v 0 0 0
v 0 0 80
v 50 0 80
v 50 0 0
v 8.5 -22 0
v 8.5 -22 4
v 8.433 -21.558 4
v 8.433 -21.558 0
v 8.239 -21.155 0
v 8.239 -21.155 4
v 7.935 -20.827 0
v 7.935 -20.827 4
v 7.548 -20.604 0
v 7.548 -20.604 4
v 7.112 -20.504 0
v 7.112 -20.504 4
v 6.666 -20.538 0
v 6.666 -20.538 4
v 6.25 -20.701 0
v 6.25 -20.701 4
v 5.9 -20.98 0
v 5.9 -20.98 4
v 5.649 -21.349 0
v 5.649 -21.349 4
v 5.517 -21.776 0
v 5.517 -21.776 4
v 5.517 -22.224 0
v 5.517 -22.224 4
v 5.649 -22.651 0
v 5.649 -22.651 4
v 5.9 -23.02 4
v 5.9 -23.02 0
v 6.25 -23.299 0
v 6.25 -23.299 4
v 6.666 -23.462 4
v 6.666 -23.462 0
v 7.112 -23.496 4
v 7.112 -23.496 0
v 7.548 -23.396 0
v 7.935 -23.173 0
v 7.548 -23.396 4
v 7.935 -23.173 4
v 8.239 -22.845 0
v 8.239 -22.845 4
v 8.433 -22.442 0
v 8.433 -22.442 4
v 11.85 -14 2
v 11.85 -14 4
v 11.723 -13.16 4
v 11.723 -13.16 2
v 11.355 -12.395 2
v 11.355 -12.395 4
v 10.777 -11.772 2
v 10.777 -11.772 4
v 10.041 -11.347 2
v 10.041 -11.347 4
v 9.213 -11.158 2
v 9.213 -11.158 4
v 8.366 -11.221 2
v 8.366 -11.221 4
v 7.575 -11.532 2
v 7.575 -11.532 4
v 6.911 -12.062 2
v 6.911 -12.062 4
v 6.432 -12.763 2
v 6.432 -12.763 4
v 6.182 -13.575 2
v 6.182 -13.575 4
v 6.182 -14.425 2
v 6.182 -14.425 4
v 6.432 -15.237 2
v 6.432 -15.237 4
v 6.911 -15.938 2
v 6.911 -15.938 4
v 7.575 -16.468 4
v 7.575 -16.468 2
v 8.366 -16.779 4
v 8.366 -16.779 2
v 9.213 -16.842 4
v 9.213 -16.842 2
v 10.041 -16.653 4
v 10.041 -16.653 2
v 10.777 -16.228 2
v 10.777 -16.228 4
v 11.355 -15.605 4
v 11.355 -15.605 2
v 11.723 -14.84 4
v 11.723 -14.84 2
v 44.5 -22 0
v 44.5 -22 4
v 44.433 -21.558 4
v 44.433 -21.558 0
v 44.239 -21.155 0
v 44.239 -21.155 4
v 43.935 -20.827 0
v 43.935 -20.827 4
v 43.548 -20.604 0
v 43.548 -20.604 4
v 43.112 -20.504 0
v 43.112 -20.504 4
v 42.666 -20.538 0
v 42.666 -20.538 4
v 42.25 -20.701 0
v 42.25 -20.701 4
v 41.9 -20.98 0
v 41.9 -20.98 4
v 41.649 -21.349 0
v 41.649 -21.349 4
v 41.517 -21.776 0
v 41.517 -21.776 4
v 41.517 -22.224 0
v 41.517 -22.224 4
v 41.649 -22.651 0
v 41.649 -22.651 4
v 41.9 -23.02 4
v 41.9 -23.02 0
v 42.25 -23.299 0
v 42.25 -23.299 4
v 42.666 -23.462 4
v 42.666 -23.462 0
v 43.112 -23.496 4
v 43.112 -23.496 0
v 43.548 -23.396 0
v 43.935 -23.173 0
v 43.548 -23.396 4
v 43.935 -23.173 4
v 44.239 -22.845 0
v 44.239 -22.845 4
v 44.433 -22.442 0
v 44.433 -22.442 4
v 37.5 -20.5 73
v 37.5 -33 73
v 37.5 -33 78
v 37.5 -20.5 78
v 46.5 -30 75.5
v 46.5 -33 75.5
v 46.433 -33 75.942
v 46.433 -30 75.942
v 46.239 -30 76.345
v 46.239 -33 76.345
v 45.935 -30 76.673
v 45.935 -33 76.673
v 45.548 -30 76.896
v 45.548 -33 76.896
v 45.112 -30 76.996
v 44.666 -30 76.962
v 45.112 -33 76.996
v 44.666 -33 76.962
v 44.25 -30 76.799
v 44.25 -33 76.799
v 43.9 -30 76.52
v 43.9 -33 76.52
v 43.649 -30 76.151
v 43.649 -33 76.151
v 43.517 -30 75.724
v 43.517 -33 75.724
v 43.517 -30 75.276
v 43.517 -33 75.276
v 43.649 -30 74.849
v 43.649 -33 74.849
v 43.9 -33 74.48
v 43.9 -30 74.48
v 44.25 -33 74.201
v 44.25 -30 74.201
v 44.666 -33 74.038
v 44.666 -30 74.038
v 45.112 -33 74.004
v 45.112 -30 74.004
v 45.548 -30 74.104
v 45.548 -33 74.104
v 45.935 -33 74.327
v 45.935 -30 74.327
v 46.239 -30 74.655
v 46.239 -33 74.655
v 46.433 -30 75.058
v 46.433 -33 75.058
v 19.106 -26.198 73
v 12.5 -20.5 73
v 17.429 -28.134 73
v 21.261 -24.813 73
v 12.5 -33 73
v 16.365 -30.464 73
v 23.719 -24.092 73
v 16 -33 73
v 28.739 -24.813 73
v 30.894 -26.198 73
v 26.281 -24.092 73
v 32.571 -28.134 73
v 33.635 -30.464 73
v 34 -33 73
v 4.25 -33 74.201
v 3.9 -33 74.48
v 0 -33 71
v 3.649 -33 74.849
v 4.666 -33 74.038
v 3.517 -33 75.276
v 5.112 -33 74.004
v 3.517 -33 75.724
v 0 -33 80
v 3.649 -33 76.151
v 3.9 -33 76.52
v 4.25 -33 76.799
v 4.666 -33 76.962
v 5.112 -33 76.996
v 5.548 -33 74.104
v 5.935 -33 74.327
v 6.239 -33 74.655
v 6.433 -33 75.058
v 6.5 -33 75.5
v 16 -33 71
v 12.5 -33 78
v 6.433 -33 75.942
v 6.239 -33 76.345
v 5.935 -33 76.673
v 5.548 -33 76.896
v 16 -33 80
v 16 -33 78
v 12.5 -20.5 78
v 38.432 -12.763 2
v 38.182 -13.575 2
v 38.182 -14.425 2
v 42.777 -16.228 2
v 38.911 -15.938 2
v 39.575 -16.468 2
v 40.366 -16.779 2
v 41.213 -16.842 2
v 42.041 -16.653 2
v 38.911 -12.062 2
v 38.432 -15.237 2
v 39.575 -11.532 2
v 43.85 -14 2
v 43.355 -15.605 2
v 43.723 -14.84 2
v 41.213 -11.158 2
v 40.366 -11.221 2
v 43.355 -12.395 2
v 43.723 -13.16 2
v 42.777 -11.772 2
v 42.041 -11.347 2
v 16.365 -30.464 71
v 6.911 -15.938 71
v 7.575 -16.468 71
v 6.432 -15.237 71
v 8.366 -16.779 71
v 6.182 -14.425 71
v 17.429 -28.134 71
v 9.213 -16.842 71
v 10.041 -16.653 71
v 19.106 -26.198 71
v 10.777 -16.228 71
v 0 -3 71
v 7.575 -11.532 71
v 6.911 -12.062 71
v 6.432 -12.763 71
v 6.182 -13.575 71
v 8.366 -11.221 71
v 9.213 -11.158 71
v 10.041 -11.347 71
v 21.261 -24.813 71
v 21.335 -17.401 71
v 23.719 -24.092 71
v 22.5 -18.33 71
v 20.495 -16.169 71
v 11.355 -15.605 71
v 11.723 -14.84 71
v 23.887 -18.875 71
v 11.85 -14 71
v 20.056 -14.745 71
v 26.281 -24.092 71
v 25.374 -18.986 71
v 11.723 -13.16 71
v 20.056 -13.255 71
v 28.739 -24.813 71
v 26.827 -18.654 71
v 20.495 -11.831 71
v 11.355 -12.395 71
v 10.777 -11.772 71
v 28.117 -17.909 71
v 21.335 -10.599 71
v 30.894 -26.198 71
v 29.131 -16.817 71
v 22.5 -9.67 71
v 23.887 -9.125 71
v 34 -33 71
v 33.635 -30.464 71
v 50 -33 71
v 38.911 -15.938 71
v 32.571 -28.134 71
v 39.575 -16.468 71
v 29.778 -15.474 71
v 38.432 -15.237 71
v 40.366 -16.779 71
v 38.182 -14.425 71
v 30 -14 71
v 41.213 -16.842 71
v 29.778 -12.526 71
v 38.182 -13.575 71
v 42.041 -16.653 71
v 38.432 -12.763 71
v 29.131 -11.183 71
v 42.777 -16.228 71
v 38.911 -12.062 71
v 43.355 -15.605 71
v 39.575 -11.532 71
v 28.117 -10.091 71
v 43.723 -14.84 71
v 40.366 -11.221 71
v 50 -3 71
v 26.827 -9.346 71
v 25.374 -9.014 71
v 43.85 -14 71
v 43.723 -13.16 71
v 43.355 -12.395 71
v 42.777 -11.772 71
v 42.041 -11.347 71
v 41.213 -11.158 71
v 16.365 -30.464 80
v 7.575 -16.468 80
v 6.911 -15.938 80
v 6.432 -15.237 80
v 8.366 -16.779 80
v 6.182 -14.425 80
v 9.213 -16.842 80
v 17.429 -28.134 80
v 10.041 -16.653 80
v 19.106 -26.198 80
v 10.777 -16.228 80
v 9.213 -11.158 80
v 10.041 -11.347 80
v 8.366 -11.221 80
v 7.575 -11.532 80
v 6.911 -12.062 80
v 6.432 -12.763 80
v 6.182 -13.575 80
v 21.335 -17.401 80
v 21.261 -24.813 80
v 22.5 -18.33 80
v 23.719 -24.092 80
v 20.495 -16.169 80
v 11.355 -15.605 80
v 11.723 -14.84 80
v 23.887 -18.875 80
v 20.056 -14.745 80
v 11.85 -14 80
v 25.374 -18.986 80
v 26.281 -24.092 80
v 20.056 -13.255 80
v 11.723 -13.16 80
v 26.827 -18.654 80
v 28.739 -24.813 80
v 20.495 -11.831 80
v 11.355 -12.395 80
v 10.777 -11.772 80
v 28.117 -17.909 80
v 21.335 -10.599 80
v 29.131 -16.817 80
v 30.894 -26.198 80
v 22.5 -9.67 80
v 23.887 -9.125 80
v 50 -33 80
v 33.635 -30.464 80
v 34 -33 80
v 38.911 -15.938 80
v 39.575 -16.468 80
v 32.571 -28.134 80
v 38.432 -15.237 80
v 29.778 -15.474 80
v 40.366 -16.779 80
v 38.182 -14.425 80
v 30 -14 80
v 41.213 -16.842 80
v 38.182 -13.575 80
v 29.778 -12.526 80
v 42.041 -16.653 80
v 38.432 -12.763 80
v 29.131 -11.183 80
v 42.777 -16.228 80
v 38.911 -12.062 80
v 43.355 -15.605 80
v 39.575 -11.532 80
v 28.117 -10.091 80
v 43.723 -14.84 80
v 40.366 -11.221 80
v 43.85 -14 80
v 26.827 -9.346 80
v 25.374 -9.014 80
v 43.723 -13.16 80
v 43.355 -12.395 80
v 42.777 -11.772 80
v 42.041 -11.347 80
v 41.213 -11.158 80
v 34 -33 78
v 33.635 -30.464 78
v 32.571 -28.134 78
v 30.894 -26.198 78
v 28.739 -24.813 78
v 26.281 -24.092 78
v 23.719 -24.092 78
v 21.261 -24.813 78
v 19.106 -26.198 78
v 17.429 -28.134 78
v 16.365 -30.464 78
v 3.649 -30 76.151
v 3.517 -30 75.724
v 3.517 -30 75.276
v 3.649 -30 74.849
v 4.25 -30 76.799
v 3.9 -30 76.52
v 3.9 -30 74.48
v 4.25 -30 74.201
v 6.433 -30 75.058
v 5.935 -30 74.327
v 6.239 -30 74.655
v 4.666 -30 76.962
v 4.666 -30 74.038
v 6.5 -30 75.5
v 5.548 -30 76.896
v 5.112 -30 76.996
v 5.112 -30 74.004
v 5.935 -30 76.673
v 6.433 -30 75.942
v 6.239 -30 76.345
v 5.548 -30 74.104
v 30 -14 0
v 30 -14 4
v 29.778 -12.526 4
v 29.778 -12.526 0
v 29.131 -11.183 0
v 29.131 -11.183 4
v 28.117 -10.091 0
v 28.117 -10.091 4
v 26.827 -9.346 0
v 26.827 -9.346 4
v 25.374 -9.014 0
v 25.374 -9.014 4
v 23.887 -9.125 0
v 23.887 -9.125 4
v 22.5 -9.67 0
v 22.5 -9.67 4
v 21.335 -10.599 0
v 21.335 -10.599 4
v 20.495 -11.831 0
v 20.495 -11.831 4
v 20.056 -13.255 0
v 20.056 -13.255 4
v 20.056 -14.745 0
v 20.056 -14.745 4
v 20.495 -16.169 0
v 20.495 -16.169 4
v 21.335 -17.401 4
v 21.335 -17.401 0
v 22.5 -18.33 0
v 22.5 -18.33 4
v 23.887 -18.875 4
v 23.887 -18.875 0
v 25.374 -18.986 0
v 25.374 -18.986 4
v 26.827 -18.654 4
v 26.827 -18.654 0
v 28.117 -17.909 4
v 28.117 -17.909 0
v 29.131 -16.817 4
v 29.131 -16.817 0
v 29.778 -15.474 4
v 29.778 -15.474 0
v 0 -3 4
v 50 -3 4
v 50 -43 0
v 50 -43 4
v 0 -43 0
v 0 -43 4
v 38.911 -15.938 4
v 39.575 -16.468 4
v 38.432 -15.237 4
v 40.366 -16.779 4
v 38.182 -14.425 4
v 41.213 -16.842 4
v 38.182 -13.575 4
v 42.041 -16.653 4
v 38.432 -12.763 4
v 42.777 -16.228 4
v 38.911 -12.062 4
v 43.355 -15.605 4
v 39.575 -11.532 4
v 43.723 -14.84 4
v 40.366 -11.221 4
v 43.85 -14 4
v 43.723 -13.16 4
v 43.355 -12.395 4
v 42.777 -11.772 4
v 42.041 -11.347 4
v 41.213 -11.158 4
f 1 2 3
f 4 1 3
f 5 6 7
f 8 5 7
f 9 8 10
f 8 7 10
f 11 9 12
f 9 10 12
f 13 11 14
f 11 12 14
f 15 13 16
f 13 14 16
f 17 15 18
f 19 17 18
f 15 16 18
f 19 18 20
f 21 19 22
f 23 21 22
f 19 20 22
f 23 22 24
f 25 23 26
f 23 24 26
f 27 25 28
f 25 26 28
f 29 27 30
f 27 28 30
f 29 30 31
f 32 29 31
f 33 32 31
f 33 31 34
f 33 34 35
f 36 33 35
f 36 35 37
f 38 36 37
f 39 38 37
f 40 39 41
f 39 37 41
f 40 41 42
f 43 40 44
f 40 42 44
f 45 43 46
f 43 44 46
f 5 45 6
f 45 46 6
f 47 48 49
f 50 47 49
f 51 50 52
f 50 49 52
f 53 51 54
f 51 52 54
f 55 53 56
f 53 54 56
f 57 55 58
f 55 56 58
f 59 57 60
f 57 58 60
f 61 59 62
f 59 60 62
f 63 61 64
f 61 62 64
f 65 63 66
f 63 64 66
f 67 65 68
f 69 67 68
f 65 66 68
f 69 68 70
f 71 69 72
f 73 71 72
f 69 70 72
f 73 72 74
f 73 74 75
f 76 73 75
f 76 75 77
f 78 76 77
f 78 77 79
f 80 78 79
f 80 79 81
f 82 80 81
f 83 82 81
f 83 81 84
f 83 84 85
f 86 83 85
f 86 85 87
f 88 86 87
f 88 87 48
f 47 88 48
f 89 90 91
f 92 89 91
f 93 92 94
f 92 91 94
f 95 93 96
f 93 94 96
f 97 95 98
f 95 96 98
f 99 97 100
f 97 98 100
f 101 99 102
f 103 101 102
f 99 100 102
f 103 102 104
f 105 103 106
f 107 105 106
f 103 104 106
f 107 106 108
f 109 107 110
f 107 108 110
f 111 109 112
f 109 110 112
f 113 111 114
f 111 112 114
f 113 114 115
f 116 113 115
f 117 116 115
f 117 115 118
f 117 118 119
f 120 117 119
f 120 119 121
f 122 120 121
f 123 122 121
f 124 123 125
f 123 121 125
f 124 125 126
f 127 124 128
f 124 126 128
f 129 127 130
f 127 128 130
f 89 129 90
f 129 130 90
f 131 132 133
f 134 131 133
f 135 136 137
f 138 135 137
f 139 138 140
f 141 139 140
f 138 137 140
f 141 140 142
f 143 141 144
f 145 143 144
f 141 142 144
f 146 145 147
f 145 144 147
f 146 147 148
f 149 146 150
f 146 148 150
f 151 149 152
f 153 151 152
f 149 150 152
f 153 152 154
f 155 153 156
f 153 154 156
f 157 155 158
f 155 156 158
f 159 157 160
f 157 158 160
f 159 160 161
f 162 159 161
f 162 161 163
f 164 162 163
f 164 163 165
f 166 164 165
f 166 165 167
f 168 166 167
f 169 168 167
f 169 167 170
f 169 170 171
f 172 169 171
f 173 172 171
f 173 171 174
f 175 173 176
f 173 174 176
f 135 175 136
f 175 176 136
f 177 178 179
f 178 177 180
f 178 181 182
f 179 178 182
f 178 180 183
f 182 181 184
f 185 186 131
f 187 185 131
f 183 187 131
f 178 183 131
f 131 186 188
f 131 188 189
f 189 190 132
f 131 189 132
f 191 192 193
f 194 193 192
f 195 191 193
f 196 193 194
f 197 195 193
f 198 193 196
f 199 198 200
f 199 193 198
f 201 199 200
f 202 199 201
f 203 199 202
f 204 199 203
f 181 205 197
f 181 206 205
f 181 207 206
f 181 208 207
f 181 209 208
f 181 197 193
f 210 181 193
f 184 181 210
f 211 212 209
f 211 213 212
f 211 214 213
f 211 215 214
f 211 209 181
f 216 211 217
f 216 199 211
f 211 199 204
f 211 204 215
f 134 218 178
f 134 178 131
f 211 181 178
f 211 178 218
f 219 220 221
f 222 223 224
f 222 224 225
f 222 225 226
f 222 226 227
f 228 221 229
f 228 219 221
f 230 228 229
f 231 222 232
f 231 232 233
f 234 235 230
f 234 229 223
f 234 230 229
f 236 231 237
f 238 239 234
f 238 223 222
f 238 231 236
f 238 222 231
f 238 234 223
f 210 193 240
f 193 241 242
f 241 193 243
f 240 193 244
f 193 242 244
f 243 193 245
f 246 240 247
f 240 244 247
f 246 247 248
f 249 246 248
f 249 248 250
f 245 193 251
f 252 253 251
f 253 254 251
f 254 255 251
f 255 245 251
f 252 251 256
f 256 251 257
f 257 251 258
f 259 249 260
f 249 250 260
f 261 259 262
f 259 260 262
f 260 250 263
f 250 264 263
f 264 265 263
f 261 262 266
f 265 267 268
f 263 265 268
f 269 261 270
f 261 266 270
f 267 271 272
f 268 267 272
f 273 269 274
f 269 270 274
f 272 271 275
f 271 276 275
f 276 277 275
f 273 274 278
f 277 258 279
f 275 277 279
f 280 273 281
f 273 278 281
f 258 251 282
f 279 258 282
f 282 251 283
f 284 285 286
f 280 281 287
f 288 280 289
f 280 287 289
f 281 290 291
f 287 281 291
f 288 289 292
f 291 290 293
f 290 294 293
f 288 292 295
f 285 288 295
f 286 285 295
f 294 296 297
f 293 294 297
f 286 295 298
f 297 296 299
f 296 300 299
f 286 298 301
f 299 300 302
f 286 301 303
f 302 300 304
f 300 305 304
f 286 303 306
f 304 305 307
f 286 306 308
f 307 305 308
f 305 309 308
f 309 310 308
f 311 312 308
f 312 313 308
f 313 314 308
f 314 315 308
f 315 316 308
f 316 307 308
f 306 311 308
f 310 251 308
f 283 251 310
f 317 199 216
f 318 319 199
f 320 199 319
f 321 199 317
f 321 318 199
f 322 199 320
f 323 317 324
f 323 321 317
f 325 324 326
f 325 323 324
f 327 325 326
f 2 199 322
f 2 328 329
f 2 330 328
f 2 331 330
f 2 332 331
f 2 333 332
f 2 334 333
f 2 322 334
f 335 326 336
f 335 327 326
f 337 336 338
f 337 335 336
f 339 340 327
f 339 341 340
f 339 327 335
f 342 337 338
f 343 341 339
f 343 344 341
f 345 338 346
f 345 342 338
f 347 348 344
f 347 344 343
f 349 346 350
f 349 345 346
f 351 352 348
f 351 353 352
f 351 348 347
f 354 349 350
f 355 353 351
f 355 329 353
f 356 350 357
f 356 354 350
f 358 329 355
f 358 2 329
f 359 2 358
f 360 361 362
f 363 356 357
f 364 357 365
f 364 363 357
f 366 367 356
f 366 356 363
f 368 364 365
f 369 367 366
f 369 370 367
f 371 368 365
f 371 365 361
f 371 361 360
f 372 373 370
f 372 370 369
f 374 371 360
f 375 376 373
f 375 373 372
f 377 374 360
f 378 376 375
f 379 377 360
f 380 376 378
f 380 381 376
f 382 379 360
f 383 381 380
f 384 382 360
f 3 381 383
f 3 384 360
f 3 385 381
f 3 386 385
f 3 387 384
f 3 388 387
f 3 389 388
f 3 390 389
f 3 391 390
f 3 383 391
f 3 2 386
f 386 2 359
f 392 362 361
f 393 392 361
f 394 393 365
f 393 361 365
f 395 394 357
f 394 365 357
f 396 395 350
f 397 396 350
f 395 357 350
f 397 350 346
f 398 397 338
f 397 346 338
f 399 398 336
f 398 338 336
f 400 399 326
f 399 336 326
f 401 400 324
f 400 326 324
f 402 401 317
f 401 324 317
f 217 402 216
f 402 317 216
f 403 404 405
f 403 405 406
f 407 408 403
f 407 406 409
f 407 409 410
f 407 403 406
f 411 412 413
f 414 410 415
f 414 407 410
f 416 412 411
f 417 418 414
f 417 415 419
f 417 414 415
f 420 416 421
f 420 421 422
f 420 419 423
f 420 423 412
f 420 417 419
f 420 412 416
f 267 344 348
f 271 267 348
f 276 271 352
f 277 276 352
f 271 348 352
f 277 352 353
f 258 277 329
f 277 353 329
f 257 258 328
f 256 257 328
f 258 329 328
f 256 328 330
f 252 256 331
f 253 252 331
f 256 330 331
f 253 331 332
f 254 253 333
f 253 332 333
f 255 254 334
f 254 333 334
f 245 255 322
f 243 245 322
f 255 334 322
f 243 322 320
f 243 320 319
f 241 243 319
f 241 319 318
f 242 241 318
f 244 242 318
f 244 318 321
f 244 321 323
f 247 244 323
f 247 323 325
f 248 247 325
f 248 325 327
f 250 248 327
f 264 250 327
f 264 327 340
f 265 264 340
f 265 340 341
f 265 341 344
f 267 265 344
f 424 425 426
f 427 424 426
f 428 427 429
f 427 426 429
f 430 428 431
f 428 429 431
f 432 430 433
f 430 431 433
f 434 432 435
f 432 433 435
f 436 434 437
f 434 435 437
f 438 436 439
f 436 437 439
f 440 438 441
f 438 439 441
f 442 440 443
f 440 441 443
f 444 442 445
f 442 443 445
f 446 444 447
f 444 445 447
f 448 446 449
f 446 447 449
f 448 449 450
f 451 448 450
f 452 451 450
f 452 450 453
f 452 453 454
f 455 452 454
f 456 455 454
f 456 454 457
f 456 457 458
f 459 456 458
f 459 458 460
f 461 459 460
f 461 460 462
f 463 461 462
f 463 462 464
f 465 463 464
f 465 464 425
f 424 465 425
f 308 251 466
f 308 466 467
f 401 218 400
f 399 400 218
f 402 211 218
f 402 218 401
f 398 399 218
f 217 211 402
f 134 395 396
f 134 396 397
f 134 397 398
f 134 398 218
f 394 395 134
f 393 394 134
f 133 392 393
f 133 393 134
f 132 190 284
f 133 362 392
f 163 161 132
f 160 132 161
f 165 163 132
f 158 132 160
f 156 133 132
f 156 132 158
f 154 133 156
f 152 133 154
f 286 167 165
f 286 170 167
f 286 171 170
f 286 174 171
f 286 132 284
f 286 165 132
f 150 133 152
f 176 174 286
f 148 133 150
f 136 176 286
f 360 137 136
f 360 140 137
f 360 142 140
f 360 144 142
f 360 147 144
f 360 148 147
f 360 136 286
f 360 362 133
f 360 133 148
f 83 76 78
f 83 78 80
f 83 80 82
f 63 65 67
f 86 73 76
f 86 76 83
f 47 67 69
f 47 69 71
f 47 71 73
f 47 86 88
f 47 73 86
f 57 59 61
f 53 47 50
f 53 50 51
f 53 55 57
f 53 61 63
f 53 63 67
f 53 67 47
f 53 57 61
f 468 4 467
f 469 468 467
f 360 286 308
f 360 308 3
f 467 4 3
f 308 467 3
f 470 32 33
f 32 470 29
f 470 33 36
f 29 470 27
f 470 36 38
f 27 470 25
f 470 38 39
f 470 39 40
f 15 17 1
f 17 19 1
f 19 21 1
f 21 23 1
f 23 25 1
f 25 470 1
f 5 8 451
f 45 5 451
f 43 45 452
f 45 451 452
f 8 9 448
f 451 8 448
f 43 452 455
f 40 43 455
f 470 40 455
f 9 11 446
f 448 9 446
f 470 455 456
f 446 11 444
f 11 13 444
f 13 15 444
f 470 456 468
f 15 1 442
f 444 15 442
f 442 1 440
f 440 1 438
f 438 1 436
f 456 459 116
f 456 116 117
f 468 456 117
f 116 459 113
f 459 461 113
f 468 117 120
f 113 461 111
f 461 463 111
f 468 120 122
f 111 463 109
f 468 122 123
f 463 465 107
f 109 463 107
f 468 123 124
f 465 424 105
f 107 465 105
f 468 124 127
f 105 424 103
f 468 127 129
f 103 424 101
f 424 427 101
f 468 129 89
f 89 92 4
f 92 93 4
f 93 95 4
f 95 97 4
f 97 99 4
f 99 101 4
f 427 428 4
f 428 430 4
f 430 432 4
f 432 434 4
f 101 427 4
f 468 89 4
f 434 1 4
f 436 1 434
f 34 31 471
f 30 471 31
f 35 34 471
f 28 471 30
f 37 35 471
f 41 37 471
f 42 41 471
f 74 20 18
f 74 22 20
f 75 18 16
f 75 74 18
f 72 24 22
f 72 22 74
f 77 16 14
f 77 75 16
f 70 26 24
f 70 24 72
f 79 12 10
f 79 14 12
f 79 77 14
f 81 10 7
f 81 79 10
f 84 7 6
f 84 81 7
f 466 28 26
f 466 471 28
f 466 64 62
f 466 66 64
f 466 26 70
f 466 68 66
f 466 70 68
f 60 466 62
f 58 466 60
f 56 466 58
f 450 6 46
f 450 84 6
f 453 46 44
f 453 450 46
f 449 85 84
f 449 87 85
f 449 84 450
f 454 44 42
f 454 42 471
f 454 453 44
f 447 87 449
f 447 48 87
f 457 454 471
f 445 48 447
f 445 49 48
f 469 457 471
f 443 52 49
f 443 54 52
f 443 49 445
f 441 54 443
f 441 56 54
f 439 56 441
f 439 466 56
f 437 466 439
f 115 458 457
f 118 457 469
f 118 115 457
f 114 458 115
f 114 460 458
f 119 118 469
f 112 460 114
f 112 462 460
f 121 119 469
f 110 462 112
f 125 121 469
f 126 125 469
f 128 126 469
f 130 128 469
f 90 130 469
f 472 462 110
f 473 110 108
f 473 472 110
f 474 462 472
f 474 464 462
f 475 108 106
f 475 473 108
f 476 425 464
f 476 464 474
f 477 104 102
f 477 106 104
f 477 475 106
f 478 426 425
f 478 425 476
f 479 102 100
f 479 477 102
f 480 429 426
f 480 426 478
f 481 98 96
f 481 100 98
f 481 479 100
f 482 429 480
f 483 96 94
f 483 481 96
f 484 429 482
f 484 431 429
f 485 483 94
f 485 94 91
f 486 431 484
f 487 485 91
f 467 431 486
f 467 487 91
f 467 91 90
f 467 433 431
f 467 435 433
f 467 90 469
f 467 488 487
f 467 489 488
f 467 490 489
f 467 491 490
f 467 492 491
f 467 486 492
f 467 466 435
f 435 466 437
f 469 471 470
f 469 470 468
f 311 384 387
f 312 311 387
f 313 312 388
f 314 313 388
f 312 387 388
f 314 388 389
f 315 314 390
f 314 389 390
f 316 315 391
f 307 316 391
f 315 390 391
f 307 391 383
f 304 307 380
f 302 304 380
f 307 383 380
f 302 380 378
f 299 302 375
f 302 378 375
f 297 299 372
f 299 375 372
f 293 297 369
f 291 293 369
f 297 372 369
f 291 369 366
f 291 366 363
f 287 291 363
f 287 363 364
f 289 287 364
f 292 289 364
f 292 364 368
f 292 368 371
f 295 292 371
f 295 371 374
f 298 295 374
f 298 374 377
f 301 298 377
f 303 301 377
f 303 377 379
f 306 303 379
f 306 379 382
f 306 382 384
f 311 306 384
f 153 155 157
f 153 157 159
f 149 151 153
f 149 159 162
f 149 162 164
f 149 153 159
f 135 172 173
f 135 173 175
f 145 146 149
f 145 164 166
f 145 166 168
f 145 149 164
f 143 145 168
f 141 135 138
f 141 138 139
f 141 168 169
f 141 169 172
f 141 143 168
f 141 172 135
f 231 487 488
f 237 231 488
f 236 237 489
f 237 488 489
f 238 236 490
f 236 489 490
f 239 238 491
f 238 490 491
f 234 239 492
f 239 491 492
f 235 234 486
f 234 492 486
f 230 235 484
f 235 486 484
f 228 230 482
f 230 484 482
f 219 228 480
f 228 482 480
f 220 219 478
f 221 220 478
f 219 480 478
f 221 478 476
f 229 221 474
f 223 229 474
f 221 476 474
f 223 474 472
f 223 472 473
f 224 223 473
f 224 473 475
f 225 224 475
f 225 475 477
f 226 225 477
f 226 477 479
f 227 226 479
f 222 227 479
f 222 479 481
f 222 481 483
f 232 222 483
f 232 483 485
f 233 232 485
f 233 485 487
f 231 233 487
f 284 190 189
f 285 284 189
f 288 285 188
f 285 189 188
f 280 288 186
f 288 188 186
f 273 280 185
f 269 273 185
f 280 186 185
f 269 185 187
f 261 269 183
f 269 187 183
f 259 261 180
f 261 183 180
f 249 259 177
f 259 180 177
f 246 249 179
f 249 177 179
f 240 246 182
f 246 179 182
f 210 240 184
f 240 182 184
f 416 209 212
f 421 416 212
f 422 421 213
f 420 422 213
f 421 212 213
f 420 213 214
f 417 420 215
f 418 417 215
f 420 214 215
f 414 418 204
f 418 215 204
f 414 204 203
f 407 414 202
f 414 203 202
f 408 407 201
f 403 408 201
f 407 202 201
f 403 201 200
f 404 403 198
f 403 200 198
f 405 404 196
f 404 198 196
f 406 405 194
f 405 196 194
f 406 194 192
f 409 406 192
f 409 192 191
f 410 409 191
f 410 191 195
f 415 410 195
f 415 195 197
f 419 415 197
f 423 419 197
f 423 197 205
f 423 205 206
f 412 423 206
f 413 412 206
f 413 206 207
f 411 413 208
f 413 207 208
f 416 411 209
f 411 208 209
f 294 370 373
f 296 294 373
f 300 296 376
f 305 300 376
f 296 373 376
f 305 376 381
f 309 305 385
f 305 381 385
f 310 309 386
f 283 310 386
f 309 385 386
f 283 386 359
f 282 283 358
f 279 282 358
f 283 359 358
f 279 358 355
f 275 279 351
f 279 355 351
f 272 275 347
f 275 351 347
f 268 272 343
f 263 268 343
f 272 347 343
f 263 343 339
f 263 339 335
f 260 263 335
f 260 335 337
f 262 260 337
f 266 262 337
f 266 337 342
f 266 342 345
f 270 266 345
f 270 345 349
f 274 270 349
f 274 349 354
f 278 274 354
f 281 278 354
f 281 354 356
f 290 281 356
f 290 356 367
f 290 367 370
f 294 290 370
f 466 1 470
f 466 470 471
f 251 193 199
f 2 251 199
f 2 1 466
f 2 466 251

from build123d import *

# Parameters (mm, degrees)
F0_W      = 50
F0_H      = 80
F1_DEPTH  = 3
F2_W      = 50
F2_H      = 4
F3_DEPTH  = 40
F2_H_2    = 9
F4_DEPTH  = 30
F5_W      = 25
F5_H      = 5
F6_DEPTH  = 12.5
F8_DEPTH  = 9
F9_R      = 1.5
F10_DEPTH = 3
F7_R      = 2.85
F11_DEPTH = 78
F7_R_2    = 5
F12_DEPTH = 80
F13_R     = 1.5
F14_DEPTH = 4


with BuildPart() as f1:
    # F0 (on Front) → F1 (new body)
    with BuildSketch(Plane.XZ):
        with Locations((25, 40)):
            Rectangle(F0_W, F0_H)
    extrude(amount=F1_DEPTH)

    # F2 (on face) → F3 (join)
    with BuildSketch(Plane.XZ.offset(3)):
        with Locations((25, 2)):
            Rectangle(F2_W, F2_H)
    extrude(amount=F3_DEPTH)

    # F2 (on face) → F4 (join)
    with BuildSketch(Plane.XZ.offset(3)):
        with Locations((25, 75.5)):
            Rectangle(F2_W, F2_H_2)
    extrude(amount=F4_DEPTH)

    # F5 (on face) → F6 (cut)
    with BuildSketch(Plane.XZ.offset(33)):
        with Locations((25, 75.5)):
            Rectangle(F5_W, F5_H)
    extrude(amount=-F6_DEPTH, mode=Mode.SUBTRACT)

    # F7 (on face) → F8 (cut)
    with BuildSketch(Plane.XY.offset(80)):
        with BuildLine():
            Line((16, -33), (34, -33))
            ThreePointArc((34, -33), (25, -24), (16, -33))
        make_face()
    extrude(amount=-F8_DEPTH, mode=Mode.SUBTRACT)

    # F9 (on face) → F10 (cut)
    with BuildSketch(Plane.XZ.offset(33)):
        with Locations((5, 75.5)):
            Circle(F9_R)
        with Locations((45, 75.5)):
            Circle(F9_R)
    extrude(amount=-F10_DEPTH, mode=Mode.SUBTRACT)

    # F7 (on face) → F11 (cut)
    with BuildSketch(Plane.XY.offset(80)):
        with Locations((9, -14)):
            Circle(F7_R)
        with Locations((41, -14)):
            Circle(F7_R)
    extrude(amount=-F11_DEPTH, mode=Mode.SUBTRACT)

    # F7 (on face) → F12 (cut)
    with BuildSketch(Plane.XY.offset(80)):
        with Locations((25, -14)):
            Circle(F7_R_2)
    extrude(amount=-F12_DEPTH, mode=Mode.SUBTRACT)

    # F13 (on face) → F14 (cut)
    with BuildSketch(Plane.XY.offset(4)):
        with Locations((7, -22)):
            Circle(F13_R)
        with Locations((43, -22)):
            Circle(F13_R)
    extrude(amount=-F14_DEPTH, mode=Mode.SUBTRACT)


solid = f1.part
